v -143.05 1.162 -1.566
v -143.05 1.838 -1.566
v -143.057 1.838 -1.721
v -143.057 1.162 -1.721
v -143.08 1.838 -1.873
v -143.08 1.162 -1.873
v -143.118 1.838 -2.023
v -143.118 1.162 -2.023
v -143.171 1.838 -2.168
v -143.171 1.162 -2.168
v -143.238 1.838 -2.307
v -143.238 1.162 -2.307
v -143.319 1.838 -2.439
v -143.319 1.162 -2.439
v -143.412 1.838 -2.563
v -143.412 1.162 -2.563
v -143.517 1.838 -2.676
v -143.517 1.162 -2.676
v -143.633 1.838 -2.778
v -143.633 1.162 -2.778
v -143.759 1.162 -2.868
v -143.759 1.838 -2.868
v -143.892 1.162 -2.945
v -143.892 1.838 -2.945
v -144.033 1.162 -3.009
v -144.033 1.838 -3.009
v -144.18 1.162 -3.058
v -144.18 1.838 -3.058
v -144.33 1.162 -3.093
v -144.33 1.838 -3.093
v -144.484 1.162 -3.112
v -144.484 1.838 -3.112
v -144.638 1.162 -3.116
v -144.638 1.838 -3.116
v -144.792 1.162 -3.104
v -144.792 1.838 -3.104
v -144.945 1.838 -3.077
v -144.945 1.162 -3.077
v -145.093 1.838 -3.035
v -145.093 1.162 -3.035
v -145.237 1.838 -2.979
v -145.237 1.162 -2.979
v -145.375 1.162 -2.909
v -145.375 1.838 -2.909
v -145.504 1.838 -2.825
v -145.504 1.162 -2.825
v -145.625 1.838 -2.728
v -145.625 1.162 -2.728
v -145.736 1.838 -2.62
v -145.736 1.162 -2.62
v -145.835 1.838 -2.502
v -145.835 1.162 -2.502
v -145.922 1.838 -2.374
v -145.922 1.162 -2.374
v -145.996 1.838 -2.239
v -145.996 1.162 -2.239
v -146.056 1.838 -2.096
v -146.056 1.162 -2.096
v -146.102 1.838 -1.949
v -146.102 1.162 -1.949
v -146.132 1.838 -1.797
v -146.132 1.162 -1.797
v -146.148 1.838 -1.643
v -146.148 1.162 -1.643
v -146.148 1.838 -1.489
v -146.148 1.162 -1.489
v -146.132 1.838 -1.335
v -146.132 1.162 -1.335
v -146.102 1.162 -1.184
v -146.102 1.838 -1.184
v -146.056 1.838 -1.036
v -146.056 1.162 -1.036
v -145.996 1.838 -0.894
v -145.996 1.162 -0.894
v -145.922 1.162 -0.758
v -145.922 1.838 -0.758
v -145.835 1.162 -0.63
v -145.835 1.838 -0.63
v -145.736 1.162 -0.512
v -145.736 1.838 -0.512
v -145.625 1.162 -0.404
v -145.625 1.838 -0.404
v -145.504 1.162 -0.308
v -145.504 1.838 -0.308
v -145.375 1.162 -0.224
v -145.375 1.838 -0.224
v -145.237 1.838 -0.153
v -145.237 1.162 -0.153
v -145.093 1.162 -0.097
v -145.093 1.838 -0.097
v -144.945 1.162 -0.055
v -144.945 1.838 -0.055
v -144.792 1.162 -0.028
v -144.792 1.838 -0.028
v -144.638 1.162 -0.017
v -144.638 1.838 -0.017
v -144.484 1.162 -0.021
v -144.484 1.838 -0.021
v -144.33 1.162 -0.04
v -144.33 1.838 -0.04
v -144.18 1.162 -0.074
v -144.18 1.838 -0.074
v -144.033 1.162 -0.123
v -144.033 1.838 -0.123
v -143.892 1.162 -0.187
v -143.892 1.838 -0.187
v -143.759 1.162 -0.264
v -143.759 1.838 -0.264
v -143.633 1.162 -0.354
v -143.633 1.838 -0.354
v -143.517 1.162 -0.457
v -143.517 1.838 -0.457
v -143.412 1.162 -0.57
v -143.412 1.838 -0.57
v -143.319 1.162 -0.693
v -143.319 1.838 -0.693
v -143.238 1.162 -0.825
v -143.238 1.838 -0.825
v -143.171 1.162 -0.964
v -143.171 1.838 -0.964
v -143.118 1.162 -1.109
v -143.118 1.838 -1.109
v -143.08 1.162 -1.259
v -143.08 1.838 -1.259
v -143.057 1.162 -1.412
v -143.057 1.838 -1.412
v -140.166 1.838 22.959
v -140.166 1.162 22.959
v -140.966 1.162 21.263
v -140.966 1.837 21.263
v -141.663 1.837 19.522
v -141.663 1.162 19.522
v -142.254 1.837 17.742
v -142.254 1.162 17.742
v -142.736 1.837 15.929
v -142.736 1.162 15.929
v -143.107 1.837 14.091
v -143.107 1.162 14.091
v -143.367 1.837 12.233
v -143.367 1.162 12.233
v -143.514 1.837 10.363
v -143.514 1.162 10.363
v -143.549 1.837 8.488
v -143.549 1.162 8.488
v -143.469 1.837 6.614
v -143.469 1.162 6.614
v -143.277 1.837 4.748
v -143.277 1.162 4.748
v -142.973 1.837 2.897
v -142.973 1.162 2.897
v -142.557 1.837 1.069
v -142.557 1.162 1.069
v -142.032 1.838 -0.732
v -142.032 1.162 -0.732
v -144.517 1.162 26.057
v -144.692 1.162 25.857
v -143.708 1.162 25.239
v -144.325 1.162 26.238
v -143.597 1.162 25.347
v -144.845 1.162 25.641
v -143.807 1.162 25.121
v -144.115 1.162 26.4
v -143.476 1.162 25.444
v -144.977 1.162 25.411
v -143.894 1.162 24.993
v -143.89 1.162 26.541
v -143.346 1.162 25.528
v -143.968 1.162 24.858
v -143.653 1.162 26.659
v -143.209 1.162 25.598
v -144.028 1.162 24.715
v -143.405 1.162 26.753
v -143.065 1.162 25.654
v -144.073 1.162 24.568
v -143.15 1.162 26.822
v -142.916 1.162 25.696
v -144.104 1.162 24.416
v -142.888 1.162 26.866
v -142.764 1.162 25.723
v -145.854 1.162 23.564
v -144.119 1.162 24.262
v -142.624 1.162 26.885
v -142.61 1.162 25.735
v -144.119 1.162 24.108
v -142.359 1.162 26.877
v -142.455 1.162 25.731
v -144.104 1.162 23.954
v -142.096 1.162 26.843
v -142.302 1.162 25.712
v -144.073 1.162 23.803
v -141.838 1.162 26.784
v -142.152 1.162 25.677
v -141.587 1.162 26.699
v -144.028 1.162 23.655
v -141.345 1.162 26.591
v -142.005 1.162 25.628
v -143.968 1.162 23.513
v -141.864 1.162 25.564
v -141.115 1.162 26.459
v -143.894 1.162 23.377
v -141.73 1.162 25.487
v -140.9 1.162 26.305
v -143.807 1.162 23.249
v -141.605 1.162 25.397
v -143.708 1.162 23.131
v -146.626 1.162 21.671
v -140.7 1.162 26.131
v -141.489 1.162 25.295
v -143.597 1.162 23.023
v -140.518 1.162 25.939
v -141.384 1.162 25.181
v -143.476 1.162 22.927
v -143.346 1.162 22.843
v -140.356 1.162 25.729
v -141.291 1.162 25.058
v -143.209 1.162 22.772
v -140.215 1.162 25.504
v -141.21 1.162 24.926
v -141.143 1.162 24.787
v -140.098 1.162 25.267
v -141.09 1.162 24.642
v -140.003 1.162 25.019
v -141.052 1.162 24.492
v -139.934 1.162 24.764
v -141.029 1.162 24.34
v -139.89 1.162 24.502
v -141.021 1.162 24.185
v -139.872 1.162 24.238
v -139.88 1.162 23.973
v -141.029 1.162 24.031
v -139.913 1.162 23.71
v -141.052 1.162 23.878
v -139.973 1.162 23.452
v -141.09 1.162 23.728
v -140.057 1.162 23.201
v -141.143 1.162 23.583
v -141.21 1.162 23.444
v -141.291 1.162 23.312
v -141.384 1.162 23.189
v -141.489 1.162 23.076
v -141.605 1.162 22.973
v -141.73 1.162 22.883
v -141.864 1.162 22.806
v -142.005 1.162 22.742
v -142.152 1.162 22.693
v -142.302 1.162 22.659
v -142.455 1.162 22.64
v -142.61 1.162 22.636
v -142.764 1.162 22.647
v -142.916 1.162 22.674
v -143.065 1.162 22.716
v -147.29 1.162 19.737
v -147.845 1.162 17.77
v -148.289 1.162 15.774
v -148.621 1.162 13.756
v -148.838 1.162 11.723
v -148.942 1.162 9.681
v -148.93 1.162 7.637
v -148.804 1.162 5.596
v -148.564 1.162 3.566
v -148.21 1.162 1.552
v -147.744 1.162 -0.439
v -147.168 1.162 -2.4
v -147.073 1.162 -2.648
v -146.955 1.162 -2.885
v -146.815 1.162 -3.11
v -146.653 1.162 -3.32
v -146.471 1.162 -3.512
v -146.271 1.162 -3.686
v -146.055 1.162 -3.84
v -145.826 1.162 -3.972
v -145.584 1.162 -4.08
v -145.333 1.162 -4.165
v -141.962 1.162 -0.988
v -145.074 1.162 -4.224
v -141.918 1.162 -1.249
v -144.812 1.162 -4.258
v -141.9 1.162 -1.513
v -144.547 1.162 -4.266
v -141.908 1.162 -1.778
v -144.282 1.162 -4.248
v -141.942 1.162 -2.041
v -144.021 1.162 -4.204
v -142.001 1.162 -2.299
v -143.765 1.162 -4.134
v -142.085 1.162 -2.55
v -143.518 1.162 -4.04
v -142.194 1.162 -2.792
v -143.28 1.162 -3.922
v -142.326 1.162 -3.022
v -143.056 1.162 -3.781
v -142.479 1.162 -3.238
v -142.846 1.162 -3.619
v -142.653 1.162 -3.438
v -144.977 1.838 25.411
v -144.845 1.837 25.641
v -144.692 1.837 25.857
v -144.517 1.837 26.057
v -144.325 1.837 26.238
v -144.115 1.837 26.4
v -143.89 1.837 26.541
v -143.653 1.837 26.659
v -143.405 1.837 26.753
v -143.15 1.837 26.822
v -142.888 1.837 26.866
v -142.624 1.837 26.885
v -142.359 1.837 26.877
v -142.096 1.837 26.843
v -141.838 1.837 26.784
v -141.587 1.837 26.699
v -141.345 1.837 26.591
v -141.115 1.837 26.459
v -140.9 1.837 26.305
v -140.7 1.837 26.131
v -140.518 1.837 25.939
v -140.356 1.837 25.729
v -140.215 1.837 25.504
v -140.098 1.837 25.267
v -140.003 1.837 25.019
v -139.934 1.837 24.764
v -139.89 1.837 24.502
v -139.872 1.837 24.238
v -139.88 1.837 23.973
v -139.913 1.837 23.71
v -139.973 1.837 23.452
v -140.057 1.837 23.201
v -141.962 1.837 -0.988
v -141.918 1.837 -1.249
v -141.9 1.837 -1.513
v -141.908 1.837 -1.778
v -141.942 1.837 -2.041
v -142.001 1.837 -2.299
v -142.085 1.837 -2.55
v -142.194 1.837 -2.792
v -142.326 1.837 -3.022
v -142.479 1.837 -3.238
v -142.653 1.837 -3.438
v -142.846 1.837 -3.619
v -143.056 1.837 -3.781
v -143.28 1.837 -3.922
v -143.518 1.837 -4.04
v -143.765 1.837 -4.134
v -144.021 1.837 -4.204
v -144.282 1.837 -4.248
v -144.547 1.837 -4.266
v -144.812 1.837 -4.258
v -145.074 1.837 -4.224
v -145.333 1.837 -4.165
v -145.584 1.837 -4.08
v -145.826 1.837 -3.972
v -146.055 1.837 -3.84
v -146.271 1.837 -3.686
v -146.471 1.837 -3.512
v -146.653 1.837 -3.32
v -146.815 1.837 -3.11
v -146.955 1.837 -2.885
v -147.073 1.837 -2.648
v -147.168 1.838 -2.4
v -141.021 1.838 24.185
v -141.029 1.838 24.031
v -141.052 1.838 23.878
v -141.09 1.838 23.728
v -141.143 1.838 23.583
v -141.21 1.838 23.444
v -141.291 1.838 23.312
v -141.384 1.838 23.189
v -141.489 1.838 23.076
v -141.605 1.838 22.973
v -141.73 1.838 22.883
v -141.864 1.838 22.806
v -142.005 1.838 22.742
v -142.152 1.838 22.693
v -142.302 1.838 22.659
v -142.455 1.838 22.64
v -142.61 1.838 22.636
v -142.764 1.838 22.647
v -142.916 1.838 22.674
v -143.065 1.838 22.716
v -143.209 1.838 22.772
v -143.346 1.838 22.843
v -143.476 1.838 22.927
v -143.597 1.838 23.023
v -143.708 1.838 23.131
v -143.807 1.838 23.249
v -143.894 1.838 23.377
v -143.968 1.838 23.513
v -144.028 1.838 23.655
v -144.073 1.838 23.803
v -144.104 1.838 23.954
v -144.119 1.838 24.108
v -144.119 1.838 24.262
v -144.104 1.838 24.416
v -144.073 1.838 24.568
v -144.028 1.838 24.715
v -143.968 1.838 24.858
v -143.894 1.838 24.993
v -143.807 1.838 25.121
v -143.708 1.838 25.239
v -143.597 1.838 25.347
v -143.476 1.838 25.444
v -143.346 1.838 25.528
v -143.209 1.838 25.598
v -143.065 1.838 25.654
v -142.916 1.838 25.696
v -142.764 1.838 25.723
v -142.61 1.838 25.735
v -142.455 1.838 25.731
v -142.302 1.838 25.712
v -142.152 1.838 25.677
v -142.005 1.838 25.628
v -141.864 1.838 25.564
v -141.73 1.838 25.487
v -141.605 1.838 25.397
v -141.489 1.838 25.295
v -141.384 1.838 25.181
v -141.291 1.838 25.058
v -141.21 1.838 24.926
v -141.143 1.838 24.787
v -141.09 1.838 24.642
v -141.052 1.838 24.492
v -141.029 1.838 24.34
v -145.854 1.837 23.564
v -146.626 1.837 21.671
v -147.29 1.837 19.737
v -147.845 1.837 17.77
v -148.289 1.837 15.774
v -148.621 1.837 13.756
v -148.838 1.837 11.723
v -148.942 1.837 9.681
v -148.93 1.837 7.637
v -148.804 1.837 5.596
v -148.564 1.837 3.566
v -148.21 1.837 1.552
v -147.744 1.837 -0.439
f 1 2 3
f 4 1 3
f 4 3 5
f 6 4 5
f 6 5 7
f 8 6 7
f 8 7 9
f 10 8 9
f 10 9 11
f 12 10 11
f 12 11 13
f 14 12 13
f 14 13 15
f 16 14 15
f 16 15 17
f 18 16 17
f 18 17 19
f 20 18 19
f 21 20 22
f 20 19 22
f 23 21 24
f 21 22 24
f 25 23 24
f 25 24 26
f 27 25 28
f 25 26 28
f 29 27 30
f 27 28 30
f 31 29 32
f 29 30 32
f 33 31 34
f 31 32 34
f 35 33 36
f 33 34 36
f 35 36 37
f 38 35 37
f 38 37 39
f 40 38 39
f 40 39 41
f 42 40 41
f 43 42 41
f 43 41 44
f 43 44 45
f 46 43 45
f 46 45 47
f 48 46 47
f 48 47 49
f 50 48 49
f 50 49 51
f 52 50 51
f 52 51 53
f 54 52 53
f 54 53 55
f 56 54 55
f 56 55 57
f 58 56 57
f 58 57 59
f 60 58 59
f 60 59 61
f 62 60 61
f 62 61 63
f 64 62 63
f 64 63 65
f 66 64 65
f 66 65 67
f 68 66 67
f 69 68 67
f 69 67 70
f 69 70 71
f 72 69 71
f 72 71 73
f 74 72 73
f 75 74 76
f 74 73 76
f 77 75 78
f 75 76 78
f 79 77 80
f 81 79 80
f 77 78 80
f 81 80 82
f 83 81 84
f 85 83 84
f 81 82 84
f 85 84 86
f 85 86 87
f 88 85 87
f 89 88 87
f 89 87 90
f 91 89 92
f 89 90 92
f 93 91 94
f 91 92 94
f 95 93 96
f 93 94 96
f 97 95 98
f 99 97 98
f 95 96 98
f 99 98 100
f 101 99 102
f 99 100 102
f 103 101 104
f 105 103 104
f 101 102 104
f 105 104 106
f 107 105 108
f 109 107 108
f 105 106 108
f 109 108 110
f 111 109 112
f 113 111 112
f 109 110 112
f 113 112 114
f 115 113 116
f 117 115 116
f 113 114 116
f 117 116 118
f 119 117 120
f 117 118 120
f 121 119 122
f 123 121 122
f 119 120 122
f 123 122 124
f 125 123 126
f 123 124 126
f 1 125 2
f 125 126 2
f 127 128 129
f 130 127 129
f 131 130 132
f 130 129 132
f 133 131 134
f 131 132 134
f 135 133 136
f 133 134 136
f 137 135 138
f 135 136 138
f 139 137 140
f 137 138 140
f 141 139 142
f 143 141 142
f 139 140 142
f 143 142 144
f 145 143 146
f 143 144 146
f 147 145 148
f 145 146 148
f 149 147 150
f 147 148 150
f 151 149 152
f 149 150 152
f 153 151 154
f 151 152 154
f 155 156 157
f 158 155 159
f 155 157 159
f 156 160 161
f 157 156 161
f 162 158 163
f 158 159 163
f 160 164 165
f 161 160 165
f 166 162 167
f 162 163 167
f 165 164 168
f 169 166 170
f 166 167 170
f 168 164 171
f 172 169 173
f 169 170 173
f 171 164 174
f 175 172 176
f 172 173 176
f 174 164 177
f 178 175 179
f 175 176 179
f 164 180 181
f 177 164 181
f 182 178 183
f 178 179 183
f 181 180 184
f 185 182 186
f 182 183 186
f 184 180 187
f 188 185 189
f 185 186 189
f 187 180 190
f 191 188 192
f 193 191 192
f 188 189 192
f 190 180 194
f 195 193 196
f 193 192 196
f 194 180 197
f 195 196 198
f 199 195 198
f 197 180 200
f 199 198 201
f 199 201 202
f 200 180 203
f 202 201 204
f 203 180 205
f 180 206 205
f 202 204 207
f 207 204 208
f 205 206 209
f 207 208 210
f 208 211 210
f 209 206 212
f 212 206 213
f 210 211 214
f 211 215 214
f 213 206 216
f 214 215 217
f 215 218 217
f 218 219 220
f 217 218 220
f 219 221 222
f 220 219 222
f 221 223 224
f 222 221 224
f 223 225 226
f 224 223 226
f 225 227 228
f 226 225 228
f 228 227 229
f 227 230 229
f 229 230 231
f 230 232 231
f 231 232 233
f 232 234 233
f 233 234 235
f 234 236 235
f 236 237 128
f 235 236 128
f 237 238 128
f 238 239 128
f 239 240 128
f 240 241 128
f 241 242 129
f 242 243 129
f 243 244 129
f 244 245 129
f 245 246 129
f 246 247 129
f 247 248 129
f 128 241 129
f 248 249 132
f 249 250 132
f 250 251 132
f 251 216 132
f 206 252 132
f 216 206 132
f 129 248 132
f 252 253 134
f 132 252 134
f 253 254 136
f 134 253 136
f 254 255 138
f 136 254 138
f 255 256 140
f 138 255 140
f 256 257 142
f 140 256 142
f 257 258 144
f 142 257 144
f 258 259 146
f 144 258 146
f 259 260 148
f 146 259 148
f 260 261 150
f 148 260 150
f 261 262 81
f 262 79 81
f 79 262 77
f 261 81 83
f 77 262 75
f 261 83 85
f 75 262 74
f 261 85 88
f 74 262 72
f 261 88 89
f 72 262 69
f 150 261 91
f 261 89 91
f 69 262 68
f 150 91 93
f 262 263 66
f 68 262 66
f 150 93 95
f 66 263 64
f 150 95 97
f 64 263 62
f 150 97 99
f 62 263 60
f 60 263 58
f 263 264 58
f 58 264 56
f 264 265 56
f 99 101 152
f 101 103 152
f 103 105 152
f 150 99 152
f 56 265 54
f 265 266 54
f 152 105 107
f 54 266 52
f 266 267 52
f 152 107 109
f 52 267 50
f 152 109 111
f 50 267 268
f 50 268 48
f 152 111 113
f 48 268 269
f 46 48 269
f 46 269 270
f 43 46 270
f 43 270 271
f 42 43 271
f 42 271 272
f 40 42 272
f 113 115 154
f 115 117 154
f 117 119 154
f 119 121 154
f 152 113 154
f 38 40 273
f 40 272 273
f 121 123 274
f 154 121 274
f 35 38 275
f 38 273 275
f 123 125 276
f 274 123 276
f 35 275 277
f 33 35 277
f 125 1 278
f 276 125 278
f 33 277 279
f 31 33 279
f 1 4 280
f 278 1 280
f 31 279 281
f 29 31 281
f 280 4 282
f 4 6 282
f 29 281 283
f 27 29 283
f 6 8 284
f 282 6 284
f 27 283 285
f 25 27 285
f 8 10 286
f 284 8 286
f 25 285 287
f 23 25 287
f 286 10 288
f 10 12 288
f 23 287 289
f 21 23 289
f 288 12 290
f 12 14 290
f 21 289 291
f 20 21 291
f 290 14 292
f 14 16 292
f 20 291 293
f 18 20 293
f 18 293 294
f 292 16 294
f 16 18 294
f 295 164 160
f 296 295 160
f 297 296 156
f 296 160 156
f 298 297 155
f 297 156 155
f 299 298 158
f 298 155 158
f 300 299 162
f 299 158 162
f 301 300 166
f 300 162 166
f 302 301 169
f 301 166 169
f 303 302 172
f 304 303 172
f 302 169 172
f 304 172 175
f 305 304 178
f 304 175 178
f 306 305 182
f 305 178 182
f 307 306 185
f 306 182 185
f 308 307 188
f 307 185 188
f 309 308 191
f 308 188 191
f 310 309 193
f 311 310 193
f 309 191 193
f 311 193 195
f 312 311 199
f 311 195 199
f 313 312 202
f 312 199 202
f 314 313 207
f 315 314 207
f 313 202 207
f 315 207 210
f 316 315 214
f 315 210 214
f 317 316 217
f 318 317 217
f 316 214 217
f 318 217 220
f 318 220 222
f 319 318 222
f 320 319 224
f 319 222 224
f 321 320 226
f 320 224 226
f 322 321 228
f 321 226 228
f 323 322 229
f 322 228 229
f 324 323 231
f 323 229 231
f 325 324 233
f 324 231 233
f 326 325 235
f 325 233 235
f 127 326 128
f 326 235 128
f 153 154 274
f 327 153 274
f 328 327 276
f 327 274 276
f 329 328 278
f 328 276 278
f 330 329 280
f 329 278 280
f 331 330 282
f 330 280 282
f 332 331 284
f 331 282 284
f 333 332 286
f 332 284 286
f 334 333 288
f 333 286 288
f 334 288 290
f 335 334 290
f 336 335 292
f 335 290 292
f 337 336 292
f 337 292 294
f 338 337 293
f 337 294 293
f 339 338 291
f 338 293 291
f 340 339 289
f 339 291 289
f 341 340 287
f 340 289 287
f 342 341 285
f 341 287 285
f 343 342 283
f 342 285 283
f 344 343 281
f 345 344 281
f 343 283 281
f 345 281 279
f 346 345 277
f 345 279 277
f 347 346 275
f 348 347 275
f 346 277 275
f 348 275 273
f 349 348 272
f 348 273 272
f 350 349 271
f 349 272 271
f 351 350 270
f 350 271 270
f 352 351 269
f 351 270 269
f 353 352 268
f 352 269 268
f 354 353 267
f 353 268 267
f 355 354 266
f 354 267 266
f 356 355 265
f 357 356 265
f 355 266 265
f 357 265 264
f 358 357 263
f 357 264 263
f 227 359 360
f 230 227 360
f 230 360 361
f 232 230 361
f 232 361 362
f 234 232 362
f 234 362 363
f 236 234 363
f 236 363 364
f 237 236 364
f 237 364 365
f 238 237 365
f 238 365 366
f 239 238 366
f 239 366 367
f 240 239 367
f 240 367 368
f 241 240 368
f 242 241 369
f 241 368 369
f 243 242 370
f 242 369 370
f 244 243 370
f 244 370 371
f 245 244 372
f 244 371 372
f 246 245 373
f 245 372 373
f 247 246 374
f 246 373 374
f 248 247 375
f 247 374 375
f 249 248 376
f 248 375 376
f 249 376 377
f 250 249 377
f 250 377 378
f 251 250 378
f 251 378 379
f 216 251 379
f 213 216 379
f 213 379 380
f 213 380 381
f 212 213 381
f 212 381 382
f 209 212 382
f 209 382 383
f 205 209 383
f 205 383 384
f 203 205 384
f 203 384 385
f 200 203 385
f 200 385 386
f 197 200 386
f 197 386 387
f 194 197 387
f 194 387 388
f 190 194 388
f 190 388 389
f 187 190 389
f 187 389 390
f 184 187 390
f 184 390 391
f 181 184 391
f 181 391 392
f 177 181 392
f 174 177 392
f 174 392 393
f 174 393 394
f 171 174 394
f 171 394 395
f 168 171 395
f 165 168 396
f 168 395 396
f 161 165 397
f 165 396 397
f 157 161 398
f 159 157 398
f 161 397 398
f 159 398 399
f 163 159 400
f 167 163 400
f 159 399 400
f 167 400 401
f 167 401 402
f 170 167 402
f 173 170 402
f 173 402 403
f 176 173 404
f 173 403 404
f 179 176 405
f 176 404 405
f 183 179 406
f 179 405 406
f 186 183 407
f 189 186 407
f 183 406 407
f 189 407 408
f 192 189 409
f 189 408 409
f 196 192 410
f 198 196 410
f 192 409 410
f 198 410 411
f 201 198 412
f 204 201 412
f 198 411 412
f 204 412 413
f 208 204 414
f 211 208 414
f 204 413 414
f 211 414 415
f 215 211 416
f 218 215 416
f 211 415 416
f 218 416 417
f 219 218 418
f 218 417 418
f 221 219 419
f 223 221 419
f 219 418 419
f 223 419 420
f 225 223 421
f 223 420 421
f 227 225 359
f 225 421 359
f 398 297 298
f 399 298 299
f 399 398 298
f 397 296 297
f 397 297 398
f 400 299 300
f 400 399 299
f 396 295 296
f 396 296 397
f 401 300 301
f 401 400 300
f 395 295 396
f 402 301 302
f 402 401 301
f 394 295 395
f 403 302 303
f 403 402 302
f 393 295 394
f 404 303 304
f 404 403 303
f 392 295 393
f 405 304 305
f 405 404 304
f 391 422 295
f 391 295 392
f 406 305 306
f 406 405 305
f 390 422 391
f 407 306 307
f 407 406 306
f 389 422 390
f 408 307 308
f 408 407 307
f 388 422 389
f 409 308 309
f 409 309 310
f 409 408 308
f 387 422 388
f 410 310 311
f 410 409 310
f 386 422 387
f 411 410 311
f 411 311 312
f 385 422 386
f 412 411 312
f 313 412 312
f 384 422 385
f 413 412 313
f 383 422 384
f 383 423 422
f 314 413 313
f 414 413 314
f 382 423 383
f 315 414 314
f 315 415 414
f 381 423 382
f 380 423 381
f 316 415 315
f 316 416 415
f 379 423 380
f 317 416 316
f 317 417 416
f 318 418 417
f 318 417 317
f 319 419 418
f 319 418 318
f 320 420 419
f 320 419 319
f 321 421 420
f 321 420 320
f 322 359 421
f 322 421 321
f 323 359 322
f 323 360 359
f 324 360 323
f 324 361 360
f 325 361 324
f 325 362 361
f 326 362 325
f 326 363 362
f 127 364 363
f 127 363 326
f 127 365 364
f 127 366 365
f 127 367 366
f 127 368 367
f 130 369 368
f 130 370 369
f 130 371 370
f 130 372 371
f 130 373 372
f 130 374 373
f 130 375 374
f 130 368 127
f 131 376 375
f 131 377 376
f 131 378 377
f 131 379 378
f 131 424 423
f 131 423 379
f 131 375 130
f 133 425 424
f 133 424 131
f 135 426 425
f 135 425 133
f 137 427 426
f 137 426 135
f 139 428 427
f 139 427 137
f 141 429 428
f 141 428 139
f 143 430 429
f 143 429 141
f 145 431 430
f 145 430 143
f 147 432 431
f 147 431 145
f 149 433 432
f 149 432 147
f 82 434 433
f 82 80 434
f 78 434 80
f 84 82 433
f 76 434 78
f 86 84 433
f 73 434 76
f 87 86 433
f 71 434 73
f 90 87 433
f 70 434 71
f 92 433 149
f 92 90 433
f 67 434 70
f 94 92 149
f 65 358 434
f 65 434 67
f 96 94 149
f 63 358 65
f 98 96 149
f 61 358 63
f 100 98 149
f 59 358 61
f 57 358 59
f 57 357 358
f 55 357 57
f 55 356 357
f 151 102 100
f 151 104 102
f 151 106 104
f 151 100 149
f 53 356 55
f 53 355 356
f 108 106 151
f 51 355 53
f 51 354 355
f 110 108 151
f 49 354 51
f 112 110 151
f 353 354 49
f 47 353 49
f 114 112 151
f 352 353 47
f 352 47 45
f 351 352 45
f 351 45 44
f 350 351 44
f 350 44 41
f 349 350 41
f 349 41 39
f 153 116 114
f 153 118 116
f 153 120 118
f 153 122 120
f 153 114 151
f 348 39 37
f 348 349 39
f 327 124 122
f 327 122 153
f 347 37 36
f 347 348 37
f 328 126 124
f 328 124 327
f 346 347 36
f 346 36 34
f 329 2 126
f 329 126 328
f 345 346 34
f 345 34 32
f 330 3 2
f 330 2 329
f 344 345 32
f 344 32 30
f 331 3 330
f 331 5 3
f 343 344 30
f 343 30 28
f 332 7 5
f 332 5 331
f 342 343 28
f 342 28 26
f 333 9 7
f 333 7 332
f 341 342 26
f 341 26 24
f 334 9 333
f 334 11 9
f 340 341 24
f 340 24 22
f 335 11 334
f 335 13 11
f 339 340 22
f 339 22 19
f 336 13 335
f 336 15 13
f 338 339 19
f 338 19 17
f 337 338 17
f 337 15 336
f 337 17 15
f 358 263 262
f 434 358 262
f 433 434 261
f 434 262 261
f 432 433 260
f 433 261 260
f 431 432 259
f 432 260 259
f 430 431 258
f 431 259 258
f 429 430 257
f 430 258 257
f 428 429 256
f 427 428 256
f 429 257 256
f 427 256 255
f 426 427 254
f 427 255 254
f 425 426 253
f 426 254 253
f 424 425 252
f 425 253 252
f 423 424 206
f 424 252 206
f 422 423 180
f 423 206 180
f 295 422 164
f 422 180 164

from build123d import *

# Parameters (mm, degrees)
SKETCH1_R           = 6
BOSS_EXTRUDE1_DEPTH = 3
SCALE1_SCALE        = 0.225
CUT_EXTRUDE2_REACH  = 2.675
SKETCH3_R           = 1.55


with BuildPart() as part:
    # Sketch1 → Boss-Extrude1 (new body)
    with BuildSketch(Plane(origin=(0, 0, 0), x_dir=(1, 0, 0), z_dir=(0, 1, 0))):
        with BuildLine():
            ThreePointArc((-154.074297715, 50.051081743), (-161.4998099, -12.720511087), (-144.338440027, -73.555521415))
            ThreePointArc((-144.338440027, -73.555521415), (-128.198146587, -78.798700571), (-122.95496743, -62.658407131))
            ThreePointArc((-122.95496743, -62.658407131), (-137.573912137, -10.835990926), (-131.248475831, 42.63610667))
            ThreePointArc((-131.248475831, 42.63610667), (-138.953899237, 57.756505148), (-154.074297715, 50.051081743))
        make_face()
        with Locations((-142.661386773, 46.343594206)):
            Circle(SKETCH1_R, mode=Mode.SUBTRACT)
        with Locations((-133.646703729, -68.106964273)):
            Circle(SKETCH1_R, mode=Mode.SUBTRACT)
    extrude(amount=BOSS_EXTRUDE1_DEPTH)


with BuildPart() as part_1:
    # Scale1: scaled about (-145.162315364, 1.5, 11.433690498)
    add(part.part.scale(SCALE1_SCALE).moved(Location((-112.500794407, 1.1625, 8.861110136))))

    # Sketch3 → Cut-Extrude2 (cut, up to next)
    with BuildSketch(Plane(origin=(0, 1.8375, 0), x_dir=(1, 0, 0), z_dir=(0, 1, 0)), mode=Mode.PRIVATE) as cut_extrude2_sk1:
        with Locations((-144.599606431, 1.56619856)):
            Circle(SKETCH3_R)
    cut_extrude2_tool1 = extrude(cut_extrude2_sk1.sketch, amount=-CUT_EXTRUDE2_REACH, mode=Mode.PRIVATE) & part_1.part
    add(cut_extrude2_tool1.solids().sort_by_distance((-144.599606, 1.8375, -1.566199))[0], mode=Mode.SUBTRACT)
    # Sketch3 → Cut-Extrude2 (cut, up to next)
    with BuildSketch(Plane(origin=(0, 1.8375, 0), x_dir=(1, 0, 0), z_dir=(0, 1, 0)), mode=Mode.PRIVATE) as cut_extrude2_sk2:
        with Locations((-142.571302746, -24.185177098)):
            Circle(SKETCH3_R)
    cut_extrude2_tool2 = extrude(cut_extrude2_sk2.sketch, amount=-CUT_EXTRUDE2_REACH, mode=Mode.PRIVATE) & part_1.part
    add(cut_extrude2_tool2.solids().sort_by_distance((-142.571303, 1.8375, 24.185177))[0], mode=Mode.SUBTRACT)


solid = part_1.part
